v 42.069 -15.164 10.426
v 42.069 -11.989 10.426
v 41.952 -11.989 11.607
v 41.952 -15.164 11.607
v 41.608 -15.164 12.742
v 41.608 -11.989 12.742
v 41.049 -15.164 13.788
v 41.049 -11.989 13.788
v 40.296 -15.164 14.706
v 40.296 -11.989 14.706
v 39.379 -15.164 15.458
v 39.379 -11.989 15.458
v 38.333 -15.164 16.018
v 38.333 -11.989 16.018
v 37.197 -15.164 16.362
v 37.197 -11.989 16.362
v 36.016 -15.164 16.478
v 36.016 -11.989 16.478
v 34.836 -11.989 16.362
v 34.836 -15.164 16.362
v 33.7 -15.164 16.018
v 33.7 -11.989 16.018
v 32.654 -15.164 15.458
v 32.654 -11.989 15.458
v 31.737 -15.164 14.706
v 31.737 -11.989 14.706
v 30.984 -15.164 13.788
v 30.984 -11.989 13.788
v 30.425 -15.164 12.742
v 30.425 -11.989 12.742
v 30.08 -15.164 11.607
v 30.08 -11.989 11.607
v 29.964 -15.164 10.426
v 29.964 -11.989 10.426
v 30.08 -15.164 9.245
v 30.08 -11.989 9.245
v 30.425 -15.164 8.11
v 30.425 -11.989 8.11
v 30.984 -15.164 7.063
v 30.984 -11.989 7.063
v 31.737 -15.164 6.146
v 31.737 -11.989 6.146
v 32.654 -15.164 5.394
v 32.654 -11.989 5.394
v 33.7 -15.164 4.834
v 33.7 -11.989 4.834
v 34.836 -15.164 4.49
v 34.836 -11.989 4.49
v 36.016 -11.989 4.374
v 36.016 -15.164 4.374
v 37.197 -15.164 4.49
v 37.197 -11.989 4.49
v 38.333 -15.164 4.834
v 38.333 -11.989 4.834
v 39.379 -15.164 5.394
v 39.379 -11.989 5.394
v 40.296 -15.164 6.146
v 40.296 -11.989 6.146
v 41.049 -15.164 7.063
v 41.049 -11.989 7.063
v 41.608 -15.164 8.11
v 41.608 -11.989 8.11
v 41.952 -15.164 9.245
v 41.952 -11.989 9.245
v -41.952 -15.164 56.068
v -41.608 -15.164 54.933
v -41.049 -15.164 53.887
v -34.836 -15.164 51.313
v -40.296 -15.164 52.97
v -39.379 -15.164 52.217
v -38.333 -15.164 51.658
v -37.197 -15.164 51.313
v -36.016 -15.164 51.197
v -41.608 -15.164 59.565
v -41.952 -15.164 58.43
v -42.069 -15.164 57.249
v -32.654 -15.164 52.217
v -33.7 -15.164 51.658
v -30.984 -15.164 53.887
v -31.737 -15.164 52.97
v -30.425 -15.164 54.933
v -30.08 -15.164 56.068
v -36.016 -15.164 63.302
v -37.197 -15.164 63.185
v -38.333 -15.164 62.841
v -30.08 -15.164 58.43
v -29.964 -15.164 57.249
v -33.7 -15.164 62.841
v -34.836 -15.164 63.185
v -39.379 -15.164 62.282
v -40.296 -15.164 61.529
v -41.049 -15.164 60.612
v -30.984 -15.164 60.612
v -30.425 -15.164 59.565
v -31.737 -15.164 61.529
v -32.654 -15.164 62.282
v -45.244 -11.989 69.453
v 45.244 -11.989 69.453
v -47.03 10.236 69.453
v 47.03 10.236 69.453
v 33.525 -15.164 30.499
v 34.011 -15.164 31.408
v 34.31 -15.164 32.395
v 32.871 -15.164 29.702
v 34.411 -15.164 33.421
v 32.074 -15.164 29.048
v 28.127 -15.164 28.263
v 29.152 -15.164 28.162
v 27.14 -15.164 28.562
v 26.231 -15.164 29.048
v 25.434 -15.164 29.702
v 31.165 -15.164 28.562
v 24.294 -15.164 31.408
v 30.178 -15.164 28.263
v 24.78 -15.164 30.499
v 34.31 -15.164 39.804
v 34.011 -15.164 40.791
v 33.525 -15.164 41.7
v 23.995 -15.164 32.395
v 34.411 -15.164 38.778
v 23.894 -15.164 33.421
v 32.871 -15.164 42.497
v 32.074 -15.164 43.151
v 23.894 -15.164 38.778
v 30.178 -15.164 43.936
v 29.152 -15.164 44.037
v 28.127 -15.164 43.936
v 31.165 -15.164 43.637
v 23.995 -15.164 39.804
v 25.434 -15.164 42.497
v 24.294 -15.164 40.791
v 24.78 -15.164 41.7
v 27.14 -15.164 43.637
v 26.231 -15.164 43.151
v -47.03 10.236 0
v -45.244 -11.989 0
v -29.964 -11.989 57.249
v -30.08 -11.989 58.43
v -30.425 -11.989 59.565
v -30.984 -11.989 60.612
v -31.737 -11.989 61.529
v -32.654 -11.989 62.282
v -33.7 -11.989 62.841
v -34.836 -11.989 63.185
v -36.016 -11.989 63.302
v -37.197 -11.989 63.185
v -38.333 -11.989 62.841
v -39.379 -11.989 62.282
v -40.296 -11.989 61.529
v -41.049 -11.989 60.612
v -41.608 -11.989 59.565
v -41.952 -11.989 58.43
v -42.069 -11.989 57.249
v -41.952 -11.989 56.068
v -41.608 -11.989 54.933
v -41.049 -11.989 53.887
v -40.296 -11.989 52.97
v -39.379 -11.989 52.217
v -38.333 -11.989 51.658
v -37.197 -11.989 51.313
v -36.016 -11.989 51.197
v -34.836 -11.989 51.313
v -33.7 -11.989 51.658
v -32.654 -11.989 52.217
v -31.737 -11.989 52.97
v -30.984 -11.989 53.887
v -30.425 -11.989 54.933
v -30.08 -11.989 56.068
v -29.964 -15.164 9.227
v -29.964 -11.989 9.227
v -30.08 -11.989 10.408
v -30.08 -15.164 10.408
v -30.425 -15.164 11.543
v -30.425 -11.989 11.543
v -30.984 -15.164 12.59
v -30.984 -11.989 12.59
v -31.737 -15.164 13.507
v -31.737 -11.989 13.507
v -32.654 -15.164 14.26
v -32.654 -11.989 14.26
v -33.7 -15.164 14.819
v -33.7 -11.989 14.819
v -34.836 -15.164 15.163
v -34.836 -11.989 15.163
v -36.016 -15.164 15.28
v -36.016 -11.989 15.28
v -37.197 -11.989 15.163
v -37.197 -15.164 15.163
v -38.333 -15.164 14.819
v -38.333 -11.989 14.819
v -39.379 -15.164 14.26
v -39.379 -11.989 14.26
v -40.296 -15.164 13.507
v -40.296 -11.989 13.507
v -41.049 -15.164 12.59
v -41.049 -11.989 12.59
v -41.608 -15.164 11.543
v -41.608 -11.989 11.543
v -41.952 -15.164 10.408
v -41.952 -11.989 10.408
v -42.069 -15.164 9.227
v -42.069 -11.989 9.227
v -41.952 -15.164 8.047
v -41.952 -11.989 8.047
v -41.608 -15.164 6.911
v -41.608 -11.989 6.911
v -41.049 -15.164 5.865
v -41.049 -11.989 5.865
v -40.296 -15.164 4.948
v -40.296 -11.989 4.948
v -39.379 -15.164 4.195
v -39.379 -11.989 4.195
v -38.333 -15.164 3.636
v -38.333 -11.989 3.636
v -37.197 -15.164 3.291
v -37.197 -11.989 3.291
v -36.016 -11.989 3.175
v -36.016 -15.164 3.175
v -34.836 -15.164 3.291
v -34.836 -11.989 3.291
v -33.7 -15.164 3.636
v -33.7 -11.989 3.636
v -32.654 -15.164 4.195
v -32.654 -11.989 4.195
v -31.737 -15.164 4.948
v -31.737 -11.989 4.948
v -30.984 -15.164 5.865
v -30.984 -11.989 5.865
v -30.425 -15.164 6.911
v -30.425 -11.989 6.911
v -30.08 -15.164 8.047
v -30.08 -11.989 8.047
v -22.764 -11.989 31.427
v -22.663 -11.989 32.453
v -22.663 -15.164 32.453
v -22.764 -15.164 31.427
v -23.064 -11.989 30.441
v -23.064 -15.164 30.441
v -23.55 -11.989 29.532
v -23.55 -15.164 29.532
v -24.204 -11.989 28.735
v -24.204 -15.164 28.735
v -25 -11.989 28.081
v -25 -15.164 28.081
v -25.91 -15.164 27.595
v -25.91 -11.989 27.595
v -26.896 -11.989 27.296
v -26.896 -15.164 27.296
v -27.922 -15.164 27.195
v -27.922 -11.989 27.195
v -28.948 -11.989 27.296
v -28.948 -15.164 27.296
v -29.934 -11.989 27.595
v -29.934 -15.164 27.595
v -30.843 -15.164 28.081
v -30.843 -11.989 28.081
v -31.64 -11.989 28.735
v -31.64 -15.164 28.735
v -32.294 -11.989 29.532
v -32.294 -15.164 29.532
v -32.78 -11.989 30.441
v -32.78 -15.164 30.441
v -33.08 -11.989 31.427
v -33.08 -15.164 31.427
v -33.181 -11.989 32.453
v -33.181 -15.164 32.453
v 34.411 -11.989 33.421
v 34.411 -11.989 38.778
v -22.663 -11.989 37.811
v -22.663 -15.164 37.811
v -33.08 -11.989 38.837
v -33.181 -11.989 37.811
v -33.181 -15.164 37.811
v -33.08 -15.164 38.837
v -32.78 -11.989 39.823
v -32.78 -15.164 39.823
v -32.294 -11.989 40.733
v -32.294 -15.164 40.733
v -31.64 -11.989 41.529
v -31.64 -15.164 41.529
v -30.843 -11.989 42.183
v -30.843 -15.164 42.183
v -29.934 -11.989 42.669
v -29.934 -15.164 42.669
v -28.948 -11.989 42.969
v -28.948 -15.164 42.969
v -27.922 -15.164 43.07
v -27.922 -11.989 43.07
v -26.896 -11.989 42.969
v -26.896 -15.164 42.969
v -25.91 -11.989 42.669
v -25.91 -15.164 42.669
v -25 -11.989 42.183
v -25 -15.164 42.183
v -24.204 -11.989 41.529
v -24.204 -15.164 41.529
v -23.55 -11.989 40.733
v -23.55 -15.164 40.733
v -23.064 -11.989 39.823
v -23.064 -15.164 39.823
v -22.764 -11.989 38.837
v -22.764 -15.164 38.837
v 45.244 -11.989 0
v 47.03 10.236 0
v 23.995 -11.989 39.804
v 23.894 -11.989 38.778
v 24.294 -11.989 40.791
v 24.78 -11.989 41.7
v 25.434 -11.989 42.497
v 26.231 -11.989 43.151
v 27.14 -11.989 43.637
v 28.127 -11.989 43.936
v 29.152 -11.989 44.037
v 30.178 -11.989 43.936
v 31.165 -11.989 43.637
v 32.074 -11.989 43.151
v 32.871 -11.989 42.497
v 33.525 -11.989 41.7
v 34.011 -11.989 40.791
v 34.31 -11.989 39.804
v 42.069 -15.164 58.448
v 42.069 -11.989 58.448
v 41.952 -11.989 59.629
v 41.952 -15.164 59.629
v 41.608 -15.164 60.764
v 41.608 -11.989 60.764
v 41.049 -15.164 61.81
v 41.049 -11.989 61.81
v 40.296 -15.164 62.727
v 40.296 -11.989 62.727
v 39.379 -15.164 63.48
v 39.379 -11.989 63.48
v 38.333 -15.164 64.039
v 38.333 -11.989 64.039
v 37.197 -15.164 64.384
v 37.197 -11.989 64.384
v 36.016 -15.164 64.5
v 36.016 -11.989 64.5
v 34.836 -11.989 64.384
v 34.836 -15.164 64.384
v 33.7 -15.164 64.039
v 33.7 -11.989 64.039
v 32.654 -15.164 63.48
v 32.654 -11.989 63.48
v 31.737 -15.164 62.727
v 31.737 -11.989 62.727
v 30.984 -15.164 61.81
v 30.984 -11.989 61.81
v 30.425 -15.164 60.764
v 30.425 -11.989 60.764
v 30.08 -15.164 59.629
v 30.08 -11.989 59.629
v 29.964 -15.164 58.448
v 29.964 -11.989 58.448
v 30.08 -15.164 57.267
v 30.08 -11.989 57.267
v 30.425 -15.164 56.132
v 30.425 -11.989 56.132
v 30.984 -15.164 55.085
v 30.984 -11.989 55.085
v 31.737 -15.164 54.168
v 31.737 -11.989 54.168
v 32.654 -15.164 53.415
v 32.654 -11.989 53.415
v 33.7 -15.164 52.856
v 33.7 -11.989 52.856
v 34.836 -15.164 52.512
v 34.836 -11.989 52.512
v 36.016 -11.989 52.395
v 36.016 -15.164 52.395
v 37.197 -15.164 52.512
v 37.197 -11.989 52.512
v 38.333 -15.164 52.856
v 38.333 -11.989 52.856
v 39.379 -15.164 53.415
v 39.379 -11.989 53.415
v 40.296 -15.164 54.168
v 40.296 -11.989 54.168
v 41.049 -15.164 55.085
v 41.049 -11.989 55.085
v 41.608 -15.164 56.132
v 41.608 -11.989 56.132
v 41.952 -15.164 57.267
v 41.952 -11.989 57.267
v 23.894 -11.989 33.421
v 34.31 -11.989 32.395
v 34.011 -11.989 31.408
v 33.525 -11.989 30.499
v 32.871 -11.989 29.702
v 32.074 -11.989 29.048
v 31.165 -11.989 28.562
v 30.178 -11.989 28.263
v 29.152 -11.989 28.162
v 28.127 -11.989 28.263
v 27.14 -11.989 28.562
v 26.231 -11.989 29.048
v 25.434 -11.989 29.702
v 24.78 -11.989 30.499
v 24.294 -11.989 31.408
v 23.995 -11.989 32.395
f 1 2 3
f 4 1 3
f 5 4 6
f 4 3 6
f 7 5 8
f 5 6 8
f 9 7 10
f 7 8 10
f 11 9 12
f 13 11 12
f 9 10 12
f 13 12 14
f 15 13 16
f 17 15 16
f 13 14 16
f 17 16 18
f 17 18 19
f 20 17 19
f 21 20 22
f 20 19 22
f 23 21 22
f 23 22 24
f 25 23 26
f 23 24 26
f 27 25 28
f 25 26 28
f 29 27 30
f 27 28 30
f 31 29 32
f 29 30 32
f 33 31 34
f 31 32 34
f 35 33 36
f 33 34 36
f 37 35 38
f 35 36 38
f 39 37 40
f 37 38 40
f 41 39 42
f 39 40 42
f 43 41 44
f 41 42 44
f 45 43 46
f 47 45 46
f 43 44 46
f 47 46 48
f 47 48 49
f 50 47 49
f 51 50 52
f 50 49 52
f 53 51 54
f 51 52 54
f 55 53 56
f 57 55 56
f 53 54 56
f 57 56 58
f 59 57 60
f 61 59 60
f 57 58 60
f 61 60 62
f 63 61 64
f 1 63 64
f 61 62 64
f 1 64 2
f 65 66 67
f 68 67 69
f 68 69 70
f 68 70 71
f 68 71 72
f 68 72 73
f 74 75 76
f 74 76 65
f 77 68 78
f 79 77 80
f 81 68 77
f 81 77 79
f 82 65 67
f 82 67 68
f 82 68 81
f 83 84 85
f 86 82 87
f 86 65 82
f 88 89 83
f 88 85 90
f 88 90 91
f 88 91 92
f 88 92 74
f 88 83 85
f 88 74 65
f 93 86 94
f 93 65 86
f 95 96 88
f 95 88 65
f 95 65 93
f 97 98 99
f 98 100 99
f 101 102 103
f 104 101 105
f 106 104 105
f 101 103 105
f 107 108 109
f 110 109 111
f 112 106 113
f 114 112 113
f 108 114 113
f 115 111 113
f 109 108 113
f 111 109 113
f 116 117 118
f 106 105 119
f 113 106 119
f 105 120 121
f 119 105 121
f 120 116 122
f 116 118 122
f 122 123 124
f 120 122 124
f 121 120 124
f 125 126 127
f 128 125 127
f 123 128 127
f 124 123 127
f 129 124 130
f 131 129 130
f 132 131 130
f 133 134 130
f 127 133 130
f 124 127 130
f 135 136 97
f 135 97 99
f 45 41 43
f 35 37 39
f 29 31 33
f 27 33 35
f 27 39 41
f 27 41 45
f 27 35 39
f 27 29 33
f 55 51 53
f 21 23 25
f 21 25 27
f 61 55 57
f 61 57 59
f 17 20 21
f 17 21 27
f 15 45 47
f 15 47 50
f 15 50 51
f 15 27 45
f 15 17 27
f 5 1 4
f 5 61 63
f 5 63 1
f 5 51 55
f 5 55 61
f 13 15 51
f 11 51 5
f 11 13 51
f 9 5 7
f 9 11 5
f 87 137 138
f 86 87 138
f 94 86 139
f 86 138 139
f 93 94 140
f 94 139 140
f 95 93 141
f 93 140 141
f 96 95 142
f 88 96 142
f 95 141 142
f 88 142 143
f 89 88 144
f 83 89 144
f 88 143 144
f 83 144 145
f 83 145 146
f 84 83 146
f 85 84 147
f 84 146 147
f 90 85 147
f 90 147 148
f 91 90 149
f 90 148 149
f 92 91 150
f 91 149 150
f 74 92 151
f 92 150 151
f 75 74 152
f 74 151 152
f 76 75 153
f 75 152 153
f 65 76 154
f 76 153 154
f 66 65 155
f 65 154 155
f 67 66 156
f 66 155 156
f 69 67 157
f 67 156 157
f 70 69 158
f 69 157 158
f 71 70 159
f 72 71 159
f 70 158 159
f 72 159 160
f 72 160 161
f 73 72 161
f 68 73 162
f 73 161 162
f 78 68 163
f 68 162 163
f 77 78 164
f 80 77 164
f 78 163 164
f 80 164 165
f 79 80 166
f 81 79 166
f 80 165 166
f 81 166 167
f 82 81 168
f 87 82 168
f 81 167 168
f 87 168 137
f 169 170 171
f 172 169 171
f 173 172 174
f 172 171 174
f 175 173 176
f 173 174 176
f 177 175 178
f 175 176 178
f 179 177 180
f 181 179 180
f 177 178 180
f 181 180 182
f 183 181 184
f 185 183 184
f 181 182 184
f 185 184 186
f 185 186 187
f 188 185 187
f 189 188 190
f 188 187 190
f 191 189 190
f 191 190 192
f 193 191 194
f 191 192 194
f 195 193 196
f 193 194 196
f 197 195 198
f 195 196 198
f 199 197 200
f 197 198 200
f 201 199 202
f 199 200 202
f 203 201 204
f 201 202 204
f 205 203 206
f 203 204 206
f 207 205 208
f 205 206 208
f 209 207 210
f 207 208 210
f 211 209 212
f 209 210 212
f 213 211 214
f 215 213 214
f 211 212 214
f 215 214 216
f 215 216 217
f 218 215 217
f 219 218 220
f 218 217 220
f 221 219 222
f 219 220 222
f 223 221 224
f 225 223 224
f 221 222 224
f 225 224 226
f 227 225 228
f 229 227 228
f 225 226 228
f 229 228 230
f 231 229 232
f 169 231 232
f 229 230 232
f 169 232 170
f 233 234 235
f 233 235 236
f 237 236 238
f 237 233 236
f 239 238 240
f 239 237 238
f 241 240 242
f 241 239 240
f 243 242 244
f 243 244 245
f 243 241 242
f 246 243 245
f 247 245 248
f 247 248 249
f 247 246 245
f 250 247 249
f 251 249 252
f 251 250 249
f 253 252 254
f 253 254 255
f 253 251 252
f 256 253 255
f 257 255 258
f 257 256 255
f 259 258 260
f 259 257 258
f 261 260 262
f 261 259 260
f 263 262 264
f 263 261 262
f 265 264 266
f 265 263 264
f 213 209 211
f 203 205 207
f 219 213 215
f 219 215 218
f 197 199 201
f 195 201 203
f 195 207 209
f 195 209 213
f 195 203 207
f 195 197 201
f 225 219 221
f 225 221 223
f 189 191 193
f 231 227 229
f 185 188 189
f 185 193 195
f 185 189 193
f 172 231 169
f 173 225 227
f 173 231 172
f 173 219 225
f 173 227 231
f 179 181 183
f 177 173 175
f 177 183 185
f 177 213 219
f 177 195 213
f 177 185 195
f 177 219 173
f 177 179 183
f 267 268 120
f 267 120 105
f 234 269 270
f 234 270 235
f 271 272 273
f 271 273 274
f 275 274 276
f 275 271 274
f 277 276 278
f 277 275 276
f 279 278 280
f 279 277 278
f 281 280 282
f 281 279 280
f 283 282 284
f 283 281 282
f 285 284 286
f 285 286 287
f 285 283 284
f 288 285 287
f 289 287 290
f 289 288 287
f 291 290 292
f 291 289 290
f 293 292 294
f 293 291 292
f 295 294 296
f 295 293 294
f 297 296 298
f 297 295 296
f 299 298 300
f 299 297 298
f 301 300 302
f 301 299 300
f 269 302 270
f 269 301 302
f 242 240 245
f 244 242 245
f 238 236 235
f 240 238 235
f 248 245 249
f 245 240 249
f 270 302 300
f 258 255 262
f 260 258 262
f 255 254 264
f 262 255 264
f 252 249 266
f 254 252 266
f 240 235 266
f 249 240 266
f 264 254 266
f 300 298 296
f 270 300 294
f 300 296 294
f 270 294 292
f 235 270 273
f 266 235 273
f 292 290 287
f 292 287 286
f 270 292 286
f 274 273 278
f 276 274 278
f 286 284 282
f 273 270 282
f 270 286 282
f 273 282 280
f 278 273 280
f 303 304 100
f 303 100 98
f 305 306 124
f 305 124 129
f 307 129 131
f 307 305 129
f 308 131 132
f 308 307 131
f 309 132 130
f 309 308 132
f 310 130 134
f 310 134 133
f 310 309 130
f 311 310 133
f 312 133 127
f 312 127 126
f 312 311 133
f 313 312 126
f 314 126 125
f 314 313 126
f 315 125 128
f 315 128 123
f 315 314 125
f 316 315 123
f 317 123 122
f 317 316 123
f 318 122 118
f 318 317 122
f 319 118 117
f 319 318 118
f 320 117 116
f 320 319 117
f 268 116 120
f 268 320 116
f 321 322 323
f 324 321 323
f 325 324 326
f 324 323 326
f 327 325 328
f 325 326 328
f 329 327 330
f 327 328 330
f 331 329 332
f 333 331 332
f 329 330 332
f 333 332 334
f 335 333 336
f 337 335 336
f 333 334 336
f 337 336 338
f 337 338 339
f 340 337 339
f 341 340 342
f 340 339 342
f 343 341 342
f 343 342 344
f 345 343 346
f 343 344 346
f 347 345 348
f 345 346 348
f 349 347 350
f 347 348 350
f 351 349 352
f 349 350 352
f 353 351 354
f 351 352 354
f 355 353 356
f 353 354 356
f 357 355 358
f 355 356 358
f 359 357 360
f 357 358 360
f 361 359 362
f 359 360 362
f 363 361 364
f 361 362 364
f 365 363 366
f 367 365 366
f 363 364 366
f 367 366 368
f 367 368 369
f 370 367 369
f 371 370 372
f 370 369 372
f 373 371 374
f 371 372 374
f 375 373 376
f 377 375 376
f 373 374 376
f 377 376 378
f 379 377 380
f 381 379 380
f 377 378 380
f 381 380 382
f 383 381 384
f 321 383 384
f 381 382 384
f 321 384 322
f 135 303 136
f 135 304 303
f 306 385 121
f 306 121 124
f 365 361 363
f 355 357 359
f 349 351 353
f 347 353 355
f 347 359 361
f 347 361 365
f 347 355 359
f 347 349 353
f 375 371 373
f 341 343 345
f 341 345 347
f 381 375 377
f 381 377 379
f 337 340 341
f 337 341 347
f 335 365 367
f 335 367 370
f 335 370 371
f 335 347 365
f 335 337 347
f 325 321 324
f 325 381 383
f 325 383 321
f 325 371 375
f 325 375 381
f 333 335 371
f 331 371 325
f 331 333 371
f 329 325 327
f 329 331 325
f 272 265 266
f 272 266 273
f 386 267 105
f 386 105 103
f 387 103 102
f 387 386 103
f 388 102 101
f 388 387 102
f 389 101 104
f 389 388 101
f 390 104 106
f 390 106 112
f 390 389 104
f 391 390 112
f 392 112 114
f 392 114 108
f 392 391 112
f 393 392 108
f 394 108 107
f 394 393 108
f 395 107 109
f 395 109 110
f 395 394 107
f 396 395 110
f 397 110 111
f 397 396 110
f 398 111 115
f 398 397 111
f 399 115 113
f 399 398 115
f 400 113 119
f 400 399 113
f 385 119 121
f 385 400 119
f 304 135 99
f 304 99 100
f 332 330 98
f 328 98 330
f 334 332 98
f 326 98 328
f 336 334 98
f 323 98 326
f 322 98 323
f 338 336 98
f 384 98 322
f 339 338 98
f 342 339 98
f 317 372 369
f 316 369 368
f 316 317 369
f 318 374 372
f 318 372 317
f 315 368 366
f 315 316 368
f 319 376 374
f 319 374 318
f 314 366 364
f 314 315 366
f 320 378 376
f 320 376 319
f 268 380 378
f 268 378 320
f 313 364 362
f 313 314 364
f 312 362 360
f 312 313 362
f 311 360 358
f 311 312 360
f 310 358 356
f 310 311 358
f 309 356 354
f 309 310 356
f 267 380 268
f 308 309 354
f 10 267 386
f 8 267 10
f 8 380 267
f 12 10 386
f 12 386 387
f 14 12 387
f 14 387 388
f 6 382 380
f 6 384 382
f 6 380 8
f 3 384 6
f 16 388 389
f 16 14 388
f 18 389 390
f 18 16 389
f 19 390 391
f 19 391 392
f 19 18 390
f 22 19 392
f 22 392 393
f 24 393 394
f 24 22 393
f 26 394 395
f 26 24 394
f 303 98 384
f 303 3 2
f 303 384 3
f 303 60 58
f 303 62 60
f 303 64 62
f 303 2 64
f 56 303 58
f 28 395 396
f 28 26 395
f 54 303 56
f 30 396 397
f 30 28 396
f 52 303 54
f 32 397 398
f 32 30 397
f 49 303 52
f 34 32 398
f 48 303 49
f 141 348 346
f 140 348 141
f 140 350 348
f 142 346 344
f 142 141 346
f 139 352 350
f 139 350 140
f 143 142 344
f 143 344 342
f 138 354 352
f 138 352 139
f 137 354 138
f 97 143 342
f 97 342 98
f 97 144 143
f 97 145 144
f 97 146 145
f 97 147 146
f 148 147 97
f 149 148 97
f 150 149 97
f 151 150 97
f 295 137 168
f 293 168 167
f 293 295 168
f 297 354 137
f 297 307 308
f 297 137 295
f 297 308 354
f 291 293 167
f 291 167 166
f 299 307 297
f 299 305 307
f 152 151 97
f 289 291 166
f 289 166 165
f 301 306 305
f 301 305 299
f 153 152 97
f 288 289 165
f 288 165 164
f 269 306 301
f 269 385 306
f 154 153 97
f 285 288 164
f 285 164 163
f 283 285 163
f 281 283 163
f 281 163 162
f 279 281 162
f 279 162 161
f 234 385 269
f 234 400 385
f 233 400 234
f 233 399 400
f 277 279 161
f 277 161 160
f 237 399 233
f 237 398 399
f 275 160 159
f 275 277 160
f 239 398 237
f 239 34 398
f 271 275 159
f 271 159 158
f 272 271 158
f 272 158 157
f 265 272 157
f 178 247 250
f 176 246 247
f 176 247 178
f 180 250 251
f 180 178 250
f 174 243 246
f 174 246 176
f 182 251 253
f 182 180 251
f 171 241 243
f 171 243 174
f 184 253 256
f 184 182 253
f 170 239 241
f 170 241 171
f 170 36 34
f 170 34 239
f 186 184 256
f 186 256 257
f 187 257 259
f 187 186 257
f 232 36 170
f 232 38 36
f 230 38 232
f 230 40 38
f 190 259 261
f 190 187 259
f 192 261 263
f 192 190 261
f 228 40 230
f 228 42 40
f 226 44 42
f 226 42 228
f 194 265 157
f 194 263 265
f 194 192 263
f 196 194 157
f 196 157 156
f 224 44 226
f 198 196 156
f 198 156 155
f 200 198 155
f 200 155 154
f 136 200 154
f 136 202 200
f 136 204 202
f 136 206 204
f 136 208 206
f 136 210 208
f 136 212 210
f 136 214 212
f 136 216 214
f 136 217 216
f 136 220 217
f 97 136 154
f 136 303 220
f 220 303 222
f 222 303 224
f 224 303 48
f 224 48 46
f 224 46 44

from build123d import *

# Parameters (mm, degrees)
BOSS_EXTRUDE1_DEPTH = 69.453125
SKETCH3_R           = 6.05234375
BOSS_EXTRUDE2_DEPTH = 3.175


with BuildPart() as part:
    # Sketch2 → Boss-Extrude1 (new body)
    with BuildSketch(Plane.XY):
        Polygon((45.24375, -11.988978873), (-45.24375, -11.988978873), (-47.0296875, 10.236021127), (47.0296875, 10.236021127), align=None)
    extrude(amount=BOSS_EXTRUDE1_DEPTH)

    # Sketch3 → Boss-Extrude2 (add)
    with BuildSketch(Plane.XZ.offset(11.988978873)):
        with Locations((36.01640625, 10.42590625)):
            Circle(SKETCH3_R)
        with Locations((-36.01640625, 9.22734375)):
            Circle(SKETCH3_R)
        with Locations((-36.01640625, 57.24921875)):
            Circle(SKETCH3_R)
        with Locations((36.01640625, 58.44778125)):
            Circle(SKETCH3_R)
        with BuildLine():
            Line((23.893870965, 33.420622184), (23.893870965, 38.778434684))
            ThreePointArc((23.893870965, 38.778434684), (29.152464715, 44.037028434), (34.411058465, 38.778434684))
            Line((34.411058465, 38.778434684), (34.411058465, 33.420622184))
            ThreePointArc((34.411058465, 33.420622184), (29.152464715, 28.162028434), (23.893870965, 33.420622184))
        make_face()
        with BuildLine():
            Line((-33.180557656, 32.453258987), (-33.180557656, 37.811071487))
            ThreePointArc((-33.180557656, 37.811071487), (-27.921963906, 43.069665237), (-22.663370156, 37.811071487))
            Line((-22.663370156, 37.811071487), (-22.663370156, 32.453258987))
            ThreePointArc((-22.663370156, 32.453258987), (-27.921963906, 27.194665237), (-33.180557656, 32.453258987))
        make_face()
    extrude(amount=BOSS_EXTRUDE2_DEPTH)


solid = part.part
